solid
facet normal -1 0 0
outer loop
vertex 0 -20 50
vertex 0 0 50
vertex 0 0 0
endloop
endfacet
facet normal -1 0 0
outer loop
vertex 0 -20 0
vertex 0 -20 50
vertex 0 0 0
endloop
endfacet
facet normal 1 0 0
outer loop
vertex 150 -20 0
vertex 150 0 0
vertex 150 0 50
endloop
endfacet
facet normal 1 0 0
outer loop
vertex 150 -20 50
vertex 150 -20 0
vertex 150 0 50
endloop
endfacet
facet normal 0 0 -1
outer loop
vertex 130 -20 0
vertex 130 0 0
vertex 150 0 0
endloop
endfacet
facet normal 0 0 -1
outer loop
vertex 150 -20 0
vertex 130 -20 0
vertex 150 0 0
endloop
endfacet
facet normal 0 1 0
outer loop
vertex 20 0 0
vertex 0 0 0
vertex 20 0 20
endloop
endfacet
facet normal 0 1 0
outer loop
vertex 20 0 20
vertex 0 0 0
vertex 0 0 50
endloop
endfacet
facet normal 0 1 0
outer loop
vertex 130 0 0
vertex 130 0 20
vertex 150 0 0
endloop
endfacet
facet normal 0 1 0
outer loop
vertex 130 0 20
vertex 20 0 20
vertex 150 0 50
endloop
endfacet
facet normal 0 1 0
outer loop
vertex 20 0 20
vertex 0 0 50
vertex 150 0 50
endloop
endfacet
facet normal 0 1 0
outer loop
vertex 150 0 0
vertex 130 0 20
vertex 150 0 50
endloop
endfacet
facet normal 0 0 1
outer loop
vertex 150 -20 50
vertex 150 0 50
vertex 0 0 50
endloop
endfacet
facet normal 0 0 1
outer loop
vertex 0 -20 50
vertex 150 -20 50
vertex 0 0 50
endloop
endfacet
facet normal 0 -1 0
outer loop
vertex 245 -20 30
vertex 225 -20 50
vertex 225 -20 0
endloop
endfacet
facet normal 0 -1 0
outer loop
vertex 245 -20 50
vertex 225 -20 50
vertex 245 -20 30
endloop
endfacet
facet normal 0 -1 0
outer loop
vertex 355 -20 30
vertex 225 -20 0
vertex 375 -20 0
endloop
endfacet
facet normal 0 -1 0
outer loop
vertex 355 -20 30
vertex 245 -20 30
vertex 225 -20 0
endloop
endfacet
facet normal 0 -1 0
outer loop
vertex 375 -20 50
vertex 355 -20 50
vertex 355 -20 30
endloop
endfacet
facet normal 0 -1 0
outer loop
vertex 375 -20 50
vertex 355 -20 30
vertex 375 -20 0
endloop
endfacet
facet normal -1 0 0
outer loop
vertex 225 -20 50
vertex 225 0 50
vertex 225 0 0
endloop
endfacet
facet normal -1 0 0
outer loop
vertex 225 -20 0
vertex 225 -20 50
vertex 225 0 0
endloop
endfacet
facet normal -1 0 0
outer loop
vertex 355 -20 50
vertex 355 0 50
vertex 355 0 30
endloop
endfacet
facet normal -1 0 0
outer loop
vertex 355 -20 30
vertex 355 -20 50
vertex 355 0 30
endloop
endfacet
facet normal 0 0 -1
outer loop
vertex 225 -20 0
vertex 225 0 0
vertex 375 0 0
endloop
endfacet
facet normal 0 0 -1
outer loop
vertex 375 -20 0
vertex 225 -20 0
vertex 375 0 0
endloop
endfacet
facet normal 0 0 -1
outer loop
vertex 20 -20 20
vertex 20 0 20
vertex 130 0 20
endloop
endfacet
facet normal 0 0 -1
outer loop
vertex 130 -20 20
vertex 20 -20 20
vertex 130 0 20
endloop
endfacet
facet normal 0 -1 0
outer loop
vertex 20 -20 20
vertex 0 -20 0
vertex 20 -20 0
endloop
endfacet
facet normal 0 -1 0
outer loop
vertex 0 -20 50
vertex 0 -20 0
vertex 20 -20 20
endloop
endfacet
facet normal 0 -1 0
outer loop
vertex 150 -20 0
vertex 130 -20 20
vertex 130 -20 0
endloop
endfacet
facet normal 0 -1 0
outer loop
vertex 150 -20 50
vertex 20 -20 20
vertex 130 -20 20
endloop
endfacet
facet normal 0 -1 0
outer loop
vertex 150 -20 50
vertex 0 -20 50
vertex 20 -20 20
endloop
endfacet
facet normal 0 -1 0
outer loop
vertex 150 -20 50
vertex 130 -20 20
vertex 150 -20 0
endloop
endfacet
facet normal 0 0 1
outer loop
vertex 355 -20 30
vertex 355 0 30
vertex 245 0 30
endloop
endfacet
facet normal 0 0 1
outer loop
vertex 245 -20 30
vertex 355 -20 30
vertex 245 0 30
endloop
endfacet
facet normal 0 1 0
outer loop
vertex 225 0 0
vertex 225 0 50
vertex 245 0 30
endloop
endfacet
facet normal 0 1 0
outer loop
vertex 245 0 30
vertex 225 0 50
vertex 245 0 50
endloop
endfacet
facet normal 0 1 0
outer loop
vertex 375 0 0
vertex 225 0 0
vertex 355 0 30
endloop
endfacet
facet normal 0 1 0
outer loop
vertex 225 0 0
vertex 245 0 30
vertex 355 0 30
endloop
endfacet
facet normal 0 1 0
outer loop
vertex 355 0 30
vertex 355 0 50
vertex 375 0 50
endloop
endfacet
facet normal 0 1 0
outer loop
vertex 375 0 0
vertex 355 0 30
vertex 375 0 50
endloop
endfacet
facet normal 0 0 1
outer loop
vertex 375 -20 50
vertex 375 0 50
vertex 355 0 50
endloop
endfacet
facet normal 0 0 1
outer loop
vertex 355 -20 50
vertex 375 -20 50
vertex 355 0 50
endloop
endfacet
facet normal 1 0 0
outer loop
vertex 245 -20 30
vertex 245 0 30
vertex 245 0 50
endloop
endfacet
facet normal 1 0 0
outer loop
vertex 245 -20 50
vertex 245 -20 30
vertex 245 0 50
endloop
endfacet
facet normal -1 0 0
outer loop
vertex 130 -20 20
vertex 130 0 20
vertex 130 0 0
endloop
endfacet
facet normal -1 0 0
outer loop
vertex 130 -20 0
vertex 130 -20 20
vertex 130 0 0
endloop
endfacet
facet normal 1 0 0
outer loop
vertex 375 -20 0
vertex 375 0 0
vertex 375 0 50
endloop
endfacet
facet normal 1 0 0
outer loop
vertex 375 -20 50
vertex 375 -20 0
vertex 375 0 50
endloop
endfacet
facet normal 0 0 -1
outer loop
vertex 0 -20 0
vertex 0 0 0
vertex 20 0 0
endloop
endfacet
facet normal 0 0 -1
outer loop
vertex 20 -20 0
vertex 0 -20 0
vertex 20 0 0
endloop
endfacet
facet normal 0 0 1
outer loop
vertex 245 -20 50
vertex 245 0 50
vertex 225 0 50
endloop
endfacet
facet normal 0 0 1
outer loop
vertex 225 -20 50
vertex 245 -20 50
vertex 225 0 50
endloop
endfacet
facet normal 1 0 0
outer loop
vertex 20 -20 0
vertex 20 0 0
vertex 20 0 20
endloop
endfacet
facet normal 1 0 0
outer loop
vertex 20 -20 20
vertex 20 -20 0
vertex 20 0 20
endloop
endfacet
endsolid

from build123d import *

# Parameters (mm, degrees)
PAD_DEPTH = 20


with BuildPart() as part:
    # Sketch → Pad (new body)
    with BuildSketch(Plane.XZ):
        Polygon((0, 50), (0, 0), (20, 0), (20, 20), (130, 20), (130, 0), (150, 0), (150, 50), align=None)
        Polygon((225, 50), (225, 0), (375, 0), (375, 50), (355, 50), (355, 30), (245, 30), (245, 50), align=None)
    extrude(amount=PAD_DEPTH)


solid = part.part
